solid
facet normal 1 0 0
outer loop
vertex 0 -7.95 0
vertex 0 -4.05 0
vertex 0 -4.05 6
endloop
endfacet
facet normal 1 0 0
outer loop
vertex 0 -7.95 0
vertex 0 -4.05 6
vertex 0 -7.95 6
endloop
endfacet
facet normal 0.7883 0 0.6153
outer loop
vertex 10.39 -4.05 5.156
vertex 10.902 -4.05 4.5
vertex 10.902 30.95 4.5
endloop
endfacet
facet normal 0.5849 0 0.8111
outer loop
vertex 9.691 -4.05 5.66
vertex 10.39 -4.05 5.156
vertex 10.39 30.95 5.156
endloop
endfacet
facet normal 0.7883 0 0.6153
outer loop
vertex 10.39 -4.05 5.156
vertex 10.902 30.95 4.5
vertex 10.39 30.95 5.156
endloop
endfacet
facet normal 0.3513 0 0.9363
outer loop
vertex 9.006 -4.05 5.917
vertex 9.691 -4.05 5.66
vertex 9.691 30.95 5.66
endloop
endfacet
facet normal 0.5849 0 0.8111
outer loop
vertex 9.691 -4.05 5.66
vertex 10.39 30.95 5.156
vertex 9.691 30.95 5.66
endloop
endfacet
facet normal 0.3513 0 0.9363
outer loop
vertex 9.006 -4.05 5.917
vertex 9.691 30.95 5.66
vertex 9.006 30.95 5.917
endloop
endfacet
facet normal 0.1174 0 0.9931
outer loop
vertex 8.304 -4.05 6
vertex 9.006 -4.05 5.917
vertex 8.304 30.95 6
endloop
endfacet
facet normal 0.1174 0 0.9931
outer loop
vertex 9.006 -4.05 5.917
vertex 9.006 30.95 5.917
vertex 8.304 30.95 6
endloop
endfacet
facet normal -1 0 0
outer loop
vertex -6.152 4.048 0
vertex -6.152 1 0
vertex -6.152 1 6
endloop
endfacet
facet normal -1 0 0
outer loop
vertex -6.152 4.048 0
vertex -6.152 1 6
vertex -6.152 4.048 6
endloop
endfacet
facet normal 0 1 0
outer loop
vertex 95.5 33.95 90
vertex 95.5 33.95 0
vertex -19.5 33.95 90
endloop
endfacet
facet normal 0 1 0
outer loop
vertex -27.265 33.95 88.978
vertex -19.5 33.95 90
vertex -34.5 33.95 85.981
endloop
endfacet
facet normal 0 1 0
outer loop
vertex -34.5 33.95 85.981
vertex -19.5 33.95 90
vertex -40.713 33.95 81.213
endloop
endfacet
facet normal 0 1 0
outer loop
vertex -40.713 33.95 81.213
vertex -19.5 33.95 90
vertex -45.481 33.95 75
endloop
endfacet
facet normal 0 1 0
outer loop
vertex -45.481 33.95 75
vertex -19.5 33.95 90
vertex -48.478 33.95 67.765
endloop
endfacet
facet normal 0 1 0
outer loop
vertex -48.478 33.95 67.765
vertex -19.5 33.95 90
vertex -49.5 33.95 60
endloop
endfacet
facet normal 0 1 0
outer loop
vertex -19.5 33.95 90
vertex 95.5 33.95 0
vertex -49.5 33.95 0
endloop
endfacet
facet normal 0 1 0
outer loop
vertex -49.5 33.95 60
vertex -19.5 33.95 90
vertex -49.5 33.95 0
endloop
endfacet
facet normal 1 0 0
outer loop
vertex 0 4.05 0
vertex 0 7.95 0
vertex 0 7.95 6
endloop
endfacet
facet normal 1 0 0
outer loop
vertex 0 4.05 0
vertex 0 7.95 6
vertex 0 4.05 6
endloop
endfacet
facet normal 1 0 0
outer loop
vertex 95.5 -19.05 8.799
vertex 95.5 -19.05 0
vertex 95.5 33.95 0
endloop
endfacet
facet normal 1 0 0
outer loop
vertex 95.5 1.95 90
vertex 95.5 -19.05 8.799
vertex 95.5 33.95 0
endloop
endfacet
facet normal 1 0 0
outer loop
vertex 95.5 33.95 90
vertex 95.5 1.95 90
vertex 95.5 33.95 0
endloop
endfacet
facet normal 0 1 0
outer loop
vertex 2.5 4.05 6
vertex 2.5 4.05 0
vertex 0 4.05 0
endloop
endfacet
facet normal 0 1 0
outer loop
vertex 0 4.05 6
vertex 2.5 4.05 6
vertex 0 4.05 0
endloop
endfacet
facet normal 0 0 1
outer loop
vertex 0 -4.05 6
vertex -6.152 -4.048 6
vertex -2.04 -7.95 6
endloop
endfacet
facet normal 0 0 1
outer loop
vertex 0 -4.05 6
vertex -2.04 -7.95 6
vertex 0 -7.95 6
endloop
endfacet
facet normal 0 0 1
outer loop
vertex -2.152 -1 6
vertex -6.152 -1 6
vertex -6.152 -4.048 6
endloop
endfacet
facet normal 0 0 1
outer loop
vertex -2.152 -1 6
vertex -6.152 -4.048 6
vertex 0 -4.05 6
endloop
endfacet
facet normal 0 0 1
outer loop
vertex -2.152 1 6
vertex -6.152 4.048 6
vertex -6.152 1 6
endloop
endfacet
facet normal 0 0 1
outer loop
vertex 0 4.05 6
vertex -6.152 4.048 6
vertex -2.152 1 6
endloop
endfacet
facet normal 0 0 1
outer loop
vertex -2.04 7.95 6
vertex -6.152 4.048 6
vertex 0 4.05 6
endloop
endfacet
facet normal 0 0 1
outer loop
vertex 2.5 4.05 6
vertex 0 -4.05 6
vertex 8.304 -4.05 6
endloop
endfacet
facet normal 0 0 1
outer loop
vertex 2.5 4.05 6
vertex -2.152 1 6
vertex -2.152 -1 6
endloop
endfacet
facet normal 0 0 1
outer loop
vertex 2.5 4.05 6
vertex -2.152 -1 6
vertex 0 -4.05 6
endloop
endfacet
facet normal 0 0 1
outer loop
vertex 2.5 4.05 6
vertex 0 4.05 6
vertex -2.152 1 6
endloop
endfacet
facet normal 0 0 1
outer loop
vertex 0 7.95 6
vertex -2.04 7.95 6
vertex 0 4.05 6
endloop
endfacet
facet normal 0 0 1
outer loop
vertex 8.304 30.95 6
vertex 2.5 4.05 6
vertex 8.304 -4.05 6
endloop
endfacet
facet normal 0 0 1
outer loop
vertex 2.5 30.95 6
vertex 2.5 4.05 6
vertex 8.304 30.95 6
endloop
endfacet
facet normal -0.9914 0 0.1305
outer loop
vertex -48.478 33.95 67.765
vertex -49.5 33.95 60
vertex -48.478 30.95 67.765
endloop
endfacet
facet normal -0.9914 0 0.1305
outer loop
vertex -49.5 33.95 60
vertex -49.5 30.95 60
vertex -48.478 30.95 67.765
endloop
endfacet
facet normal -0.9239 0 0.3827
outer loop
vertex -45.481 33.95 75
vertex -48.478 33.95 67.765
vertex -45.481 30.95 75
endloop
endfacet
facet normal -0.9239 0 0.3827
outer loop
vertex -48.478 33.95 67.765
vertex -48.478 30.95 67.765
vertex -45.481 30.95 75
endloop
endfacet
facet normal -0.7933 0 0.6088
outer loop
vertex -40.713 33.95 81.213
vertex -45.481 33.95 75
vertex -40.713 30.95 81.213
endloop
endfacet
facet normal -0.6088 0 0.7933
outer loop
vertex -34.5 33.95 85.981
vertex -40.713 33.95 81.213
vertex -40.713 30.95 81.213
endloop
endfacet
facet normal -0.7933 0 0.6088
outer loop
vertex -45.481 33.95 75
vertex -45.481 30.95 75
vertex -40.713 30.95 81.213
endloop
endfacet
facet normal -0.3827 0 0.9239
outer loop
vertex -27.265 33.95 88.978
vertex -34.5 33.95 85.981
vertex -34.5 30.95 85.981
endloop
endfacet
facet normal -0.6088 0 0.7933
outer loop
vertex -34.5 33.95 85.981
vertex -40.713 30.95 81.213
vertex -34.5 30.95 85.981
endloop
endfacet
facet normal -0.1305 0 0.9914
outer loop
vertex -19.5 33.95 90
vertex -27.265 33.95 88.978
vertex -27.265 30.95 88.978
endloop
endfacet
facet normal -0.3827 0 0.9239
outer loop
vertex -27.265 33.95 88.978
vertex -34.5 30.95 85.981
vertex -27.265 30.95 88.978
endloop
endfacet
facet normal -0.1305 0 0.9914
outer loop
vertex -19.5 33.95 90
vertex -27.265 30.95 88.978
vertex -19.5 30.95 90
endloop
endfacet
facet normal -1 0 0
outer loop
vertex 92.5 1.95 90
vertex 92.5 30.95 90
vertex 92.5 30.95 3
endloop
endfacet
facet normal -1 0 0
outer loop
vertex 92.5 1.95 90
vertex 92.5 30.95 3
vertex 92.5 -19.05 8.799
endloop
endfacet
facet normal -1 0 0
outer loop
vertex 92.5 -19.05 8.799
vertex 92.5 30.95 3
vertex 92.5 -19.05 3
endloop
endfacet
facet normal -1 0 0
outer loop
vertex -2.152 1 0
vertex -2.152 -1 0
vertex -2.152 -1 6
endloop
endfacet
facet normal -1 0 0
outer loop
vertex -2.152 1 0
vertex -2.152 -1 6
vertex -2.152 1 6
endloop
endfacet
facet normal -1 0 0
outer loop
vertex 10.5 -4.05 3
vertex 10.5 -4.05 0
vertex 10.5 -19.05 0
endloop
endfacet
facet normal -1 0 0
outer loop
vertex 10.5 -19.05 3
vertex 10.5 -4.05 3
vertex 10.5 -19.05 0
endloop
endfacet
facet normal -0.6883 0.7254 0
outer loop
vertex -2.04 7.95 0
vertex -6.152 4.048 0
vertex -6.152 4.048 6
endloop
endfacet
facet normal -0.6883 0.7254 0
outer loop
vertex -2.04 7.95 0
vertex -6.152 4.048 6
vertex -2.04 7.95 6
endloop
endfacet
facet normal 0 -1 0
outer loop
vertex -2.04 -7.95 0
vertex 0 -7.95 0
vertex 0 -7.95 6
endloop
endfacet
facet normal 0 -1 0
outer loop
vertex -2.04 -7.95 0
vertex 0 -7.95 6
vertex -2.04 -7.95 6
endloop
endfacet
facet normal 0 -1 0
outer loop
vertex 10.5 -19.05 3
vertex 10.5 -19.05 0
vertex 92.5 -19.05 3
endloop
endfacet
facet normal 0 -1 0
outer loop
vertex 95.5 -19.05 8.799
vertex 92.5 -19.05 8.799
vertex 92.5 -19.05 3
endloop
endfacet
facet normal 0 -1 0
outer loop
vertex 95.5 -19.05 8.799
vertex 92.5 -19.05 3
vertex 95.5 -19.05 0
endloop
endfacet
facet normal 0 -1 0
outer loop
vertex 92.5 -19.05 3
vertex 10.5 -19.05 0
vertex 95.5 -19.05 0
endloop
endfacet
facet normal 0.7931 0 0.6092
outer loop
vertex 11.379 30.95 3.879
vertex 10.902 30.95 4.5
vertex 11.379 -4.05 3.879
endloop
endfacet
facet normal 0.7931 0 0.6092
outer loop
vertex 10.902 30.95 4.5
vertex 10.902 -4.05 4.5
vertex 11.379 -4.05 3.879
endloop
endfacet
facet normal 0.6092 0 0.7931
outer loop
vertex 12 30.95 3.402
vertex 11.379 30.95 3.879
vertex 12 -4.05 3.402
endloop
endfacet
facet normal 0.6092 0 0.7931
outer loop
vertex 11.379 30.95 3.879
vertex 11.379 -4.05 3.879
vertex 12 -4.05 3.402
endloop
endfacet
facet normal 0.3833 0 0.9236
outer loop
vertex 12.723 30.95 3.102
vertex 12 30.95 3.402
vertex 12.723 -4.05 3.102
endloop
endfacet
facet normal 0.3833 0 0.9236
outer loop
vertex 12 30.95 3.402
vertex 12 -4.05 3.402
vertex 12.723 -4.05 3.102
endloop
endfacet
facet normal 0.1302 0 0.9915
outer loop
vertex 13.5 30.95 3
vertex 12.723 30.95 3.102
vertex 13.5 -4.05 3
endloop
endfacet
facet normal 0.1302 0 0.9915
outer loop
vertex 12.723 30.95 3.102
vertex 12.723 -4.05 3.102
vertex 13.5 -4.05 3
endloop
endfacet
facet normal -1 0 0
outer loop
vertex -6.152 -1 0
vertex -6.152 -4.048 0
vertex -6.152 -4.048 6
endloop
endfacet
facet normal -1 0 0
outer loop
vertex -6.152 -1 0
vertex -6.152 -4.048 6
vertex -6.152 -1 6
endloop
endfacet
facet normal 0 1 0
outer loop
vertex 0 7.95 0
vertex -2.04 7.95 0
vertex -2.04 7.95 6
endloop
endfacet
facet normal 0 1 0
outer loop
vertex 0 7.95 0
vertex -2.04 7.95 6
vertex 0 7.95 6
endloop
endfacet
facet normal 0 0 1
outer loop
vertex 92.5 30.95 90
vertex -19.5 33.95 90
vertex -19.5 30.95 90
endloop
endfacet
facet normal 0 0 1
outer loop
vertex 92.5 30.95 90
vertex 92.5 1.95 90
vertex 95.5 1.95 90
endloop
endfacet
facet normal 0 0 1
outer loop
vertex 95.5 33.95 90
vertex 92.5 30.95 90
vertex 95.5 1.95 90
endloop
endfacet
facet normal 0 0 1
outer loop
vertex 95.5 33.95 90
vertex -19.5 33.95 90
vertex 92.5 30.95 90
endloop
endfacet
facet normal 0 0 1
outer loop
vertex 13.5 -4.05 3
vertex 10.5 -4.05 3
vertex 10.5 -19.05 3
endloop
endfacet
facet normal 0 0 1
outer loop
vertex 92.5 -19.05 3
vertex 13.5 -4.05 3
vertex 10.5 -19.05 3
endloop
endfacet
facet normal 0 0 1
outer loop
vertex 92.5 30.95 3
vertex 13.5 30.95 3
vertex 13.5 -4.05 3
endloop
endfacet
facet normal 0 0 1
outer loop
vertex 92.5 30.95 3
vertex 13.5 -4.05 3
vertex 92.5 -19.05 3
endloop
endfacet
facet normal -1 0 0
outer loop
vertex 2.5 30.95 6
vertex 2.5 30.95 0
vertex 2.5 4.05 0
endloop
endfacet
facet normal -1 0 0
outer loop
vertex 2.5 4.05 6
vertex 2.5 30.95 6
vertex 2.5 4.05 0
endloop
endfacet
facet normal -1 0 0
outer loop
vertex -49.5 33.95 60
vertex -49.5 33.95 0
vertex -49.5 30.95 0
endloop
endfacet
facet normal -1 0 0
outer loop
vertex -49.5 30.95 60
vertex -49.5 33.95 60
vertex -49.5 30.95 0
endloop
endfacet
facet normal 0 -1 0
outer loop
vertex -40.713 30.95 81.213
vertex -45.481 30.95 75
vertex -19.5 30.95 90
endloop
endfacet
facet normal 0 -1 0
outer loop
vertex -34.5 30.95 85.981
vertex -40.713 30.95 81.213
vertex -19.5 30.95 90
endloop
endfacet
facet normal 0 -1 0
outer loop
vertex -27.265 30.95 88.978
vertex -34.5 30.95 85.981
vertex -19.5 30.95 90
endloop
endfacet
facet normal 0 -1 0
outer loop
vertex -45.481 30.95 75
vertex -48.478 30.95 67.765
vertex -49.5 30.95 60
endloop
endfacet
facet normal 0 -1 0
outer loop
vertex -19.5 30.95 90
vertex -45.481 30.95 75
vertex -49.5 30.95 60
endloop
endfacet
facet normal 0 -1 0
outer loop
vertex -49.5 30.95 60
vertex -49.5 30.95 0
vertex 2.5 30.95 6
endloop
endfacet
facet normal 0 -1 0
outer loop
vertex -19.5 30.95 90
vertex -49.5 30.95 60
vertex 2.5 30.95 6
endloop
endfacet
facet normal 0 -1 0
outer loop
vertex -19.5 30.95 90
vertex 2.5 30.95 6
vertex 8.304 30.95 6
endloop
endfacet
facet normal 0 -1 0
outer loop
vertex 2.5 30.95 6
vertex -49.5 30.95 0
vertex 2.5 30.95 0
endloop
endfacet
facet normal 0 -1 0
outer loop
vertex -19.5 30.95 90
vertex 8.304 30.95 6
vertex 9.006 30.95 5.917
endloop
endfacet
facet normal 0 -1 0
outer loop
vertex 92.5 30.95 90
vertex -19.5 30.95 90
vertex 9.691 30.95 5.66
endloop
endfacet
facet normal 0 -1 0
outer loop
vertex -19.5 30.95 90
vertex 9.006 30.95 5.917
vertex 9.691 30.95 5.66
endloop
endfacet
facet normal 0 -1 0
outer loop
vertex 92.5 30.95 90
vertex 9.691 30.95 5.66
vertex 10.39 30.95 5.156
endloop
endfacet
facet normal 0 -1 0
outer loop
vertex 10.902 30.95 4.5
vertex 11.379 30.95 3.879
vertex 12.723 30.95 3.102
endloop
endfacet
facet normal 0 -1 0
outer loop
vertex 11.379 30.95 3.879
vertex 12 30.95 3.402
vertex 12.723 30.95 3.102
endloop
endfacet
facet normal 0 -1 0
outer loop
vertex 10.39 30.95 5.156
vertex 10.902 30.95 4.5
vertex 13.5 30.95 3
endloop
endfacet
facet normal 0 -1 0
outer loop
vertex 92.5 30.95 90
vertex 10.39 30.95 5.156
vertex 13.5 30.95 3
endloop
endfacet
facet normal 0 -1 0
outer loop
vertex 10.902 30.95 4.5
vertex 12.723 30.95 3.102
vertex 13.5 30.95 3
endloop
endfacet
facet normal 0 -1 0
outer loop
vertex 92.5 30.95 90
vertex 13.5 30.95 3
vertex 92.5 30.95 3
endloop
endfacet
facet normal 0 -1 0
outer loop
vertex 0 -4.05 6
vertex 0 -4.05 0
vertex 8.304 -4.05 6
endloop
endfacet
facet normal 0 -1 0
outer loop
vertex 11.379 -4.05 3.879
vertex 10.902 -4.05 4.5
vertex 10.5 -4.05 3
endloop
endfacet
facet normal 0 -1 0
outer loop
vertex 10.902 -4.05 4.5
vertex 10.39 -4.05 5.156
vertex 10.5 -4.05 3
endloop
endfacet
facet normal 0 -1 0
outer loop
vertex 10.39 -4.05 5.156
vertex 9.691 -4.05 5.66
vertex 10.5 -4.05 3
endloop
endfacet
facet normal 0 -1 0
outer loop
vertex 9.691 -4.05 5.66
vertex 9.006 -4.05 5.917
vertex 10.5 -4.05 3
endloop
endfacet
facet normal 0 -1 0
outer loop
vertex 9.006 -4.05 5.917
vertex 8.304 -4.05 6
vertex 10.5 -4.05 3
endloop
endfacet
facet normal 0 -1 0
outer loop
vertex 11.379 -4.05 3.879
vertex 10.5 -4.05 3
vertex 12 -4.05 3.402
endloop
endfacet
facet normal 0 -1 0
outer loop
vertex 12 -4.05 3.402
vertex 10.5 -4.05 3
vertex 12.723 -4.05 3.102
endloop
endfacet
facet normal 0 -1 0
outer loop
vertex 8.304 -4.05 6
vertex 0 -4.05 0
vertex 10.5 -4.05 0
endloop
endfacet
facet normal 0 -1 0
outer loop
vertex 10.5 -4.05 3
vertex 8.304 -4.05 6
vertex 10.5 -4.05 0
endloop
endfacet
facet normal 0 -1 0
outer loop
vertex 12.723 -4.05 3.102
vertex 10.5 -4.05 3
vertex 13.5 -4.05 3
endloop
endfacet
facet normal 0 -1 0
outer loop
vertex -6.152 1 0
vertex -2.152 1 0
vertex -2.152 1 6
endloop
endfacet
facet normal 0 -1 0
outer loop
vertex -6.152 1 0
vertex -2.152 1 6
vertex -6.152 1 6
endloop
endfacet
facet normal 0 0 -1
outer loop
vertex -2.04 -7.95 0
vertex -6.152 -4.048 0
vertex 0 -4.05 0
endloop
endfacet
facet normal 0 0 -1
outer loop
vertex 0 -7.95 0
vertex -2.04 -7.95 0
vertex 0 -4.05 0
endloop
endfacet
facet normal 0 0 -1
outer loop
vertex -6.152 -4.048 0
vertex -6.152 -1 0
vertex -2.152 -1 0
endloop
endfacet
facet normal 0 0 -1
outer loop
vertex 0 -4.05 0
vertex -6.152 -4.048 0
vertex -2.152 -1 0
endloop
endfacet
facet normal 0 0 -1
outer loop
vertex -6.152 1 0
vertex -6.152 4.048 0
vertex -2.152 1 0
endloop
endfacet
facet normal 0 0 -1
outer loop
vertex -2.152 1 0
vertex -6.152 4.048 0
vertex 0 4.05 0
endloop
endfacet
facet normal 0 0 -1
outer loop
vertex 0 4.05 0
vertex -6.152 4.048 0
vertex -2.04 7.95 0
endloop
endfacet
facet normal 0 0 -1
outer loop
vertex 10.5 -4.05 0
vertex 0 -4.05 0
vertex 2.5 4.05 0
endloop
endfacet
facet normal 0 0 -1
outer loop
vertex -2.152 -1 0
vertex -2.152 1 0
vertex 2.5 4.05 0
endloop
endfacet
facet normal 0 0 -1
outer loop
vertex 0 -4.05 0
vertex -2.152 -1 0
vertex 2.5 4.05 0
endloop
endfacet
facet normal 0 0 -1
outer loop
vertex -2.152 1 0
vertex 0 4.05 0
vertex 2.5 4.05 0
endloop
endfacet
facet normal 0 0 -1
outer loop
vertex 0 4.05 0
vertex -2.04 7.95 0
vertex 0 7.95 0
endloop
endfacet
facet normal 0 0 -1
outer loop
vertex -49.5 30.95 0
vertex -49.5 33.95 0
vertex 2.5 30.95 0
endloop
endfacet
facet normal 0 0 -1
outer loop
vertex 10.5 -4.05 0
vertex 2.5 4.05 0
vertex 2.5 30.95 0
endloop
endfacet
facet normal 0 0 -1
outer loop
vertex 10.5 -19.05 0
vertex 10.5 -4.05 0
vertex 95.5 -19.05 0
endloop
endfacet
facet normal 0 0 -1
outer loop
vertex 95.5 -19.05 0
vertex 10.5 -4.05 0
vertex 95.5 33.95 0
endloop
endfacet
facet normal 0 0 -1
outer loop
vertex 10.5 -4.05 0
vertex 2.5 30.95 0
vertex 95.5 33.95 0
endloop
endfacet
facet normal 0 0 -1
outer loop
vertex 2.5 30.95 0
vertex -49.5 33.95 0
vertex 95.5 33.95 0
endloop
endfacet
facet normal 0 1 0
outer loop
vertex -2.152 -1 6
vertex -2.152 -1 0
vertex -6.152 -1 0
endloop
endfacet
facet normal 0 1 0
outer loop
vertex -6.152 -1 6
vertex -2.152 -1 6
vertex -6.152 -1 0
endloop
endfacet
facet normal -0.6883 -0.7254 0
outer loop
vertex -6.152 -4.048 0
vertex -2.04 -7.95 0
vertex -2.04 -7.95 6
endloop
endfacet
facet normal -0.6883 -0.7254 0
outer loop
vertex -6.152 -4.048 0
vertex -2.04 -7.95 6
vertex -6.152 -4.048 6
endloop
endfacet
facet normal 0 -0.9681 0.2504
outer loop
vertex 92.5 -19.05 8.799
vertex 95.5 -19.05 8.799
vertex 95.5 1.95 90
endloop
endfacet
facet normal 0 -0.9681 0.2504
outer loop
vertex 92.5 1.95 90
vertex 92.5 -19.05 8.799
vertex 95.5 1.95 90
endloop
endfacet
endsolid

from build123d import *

# Parameters (mm, degrees)
BOSS_EXTRUDE1_DEPTH = 6
BOSS_EXTRUDE2_DEPTH = 90
BOSS_EXTRUDE3_DEPTH = 3
FILLET1_R           = 3
FILLET2_R           = 3
FILLET3_R           = 30
SKETCH4_W           = 4
SKETCH4_H           = 2
CUT_EXTRUDE1_DEPTH  = 136.546495779
CUT_EXTRUDE2_DEPTH  = 175.004604959


with BuildPart() as part:
    # Sketch2 → Boss-Extrude1 (new body)
    with BuildSketch(Plane.XY):
        Polygon((2.5, 4.05), (0, 4.05), (0, -4.05), (10.5, -4.05), (10.5, 30.95), (2.5, 30.95), align=None)
        Polygon((-2.04, 7.95), (0, 7.95), (0, -7.95), (-2.04, -7.95), (-6.152414984, -4.048), (-6.152414984, 4.048), align=None)
    extrude(amount=BOSS_EXTRUDE1_DEPTH)

    # Sketch2<3> → Boss-Extrude2 (add)
    with BuildSketch(Plane.XY):
        Polygon((-49.5, 30.95), (92.5, 30.95), (92.5, -19.05), (95.5, -19.05), (95.5, 33.95), (-49.5, 33.95), align=None)
    extrude(amount=BOSS_EXTRUDE2_DEPTH)

    # Sketch2<4> → Boss-Extrude3 (add)
    with BuildSketch(Plane.XY):
        Polygon((10.5, 30.95), (10.5, -4.05), (10.5, -19.05), (92.5, -19.05), (92.5, 30.95), (30.5, 30.95), align=None)
    extrude(amount=BOSS_EXTRUDE3_DEPTH)

    # Fillet1
    fillet1_edges = [part.edges().sort_by_distance(p)[0] for p in [
        (10.5, 13.45, 3),
    ]]
    fillet(fillet1_edges, radius=FILLET1_R - 0.0001)  # a hair under: the kernel refuses the full size

    # Fillet2
    fillet2_edges = [part.edges().sort_by_distance(p)[0] for p in [
        (10.5, 13.45, 6),
    ]]
    fillet(fillet2_edges, radius=FILLET2_R)

    # Fillet3
    fillet3_edges = [part.edges().sort_by_distance(p)[0] for p in [
        (-49.5, 32.45, 90),
    ]]
    fillet(fillet3_edges, radius=FILLET3_R)

    # Sketch4 → Cut-Extrude1 (cut, through all)
    with BuildSketch(Plane(origin=(0, 0, 0), x_dir=(-1, 0, 0), z_dir=(0, 0, -1))):
        with Locations((4.152414984, 0)):
            Rectangle(SKETCH4_W, SKETCH4_H)
    extrude(amount=-CUT_EXTRUDE1_DEPTH, mode=Mode.SUBTRACT)

    # Sketch5 → Cut-Extrude2 (cut, through all)
    with BuildSketch(Plane(origin=(95.5, 0, 0), x_dir=(0, 0, -1), z_dir=(1, 0, 0))):
        Polygon((-8.799025007, -19.05), (-90, 1.95), (-90, -19.05), align=None)
    extrude(amount=-CUT_EXTRUDE2_DEPTH, mode=Mode.SUBTRACT)


solid = part.part
